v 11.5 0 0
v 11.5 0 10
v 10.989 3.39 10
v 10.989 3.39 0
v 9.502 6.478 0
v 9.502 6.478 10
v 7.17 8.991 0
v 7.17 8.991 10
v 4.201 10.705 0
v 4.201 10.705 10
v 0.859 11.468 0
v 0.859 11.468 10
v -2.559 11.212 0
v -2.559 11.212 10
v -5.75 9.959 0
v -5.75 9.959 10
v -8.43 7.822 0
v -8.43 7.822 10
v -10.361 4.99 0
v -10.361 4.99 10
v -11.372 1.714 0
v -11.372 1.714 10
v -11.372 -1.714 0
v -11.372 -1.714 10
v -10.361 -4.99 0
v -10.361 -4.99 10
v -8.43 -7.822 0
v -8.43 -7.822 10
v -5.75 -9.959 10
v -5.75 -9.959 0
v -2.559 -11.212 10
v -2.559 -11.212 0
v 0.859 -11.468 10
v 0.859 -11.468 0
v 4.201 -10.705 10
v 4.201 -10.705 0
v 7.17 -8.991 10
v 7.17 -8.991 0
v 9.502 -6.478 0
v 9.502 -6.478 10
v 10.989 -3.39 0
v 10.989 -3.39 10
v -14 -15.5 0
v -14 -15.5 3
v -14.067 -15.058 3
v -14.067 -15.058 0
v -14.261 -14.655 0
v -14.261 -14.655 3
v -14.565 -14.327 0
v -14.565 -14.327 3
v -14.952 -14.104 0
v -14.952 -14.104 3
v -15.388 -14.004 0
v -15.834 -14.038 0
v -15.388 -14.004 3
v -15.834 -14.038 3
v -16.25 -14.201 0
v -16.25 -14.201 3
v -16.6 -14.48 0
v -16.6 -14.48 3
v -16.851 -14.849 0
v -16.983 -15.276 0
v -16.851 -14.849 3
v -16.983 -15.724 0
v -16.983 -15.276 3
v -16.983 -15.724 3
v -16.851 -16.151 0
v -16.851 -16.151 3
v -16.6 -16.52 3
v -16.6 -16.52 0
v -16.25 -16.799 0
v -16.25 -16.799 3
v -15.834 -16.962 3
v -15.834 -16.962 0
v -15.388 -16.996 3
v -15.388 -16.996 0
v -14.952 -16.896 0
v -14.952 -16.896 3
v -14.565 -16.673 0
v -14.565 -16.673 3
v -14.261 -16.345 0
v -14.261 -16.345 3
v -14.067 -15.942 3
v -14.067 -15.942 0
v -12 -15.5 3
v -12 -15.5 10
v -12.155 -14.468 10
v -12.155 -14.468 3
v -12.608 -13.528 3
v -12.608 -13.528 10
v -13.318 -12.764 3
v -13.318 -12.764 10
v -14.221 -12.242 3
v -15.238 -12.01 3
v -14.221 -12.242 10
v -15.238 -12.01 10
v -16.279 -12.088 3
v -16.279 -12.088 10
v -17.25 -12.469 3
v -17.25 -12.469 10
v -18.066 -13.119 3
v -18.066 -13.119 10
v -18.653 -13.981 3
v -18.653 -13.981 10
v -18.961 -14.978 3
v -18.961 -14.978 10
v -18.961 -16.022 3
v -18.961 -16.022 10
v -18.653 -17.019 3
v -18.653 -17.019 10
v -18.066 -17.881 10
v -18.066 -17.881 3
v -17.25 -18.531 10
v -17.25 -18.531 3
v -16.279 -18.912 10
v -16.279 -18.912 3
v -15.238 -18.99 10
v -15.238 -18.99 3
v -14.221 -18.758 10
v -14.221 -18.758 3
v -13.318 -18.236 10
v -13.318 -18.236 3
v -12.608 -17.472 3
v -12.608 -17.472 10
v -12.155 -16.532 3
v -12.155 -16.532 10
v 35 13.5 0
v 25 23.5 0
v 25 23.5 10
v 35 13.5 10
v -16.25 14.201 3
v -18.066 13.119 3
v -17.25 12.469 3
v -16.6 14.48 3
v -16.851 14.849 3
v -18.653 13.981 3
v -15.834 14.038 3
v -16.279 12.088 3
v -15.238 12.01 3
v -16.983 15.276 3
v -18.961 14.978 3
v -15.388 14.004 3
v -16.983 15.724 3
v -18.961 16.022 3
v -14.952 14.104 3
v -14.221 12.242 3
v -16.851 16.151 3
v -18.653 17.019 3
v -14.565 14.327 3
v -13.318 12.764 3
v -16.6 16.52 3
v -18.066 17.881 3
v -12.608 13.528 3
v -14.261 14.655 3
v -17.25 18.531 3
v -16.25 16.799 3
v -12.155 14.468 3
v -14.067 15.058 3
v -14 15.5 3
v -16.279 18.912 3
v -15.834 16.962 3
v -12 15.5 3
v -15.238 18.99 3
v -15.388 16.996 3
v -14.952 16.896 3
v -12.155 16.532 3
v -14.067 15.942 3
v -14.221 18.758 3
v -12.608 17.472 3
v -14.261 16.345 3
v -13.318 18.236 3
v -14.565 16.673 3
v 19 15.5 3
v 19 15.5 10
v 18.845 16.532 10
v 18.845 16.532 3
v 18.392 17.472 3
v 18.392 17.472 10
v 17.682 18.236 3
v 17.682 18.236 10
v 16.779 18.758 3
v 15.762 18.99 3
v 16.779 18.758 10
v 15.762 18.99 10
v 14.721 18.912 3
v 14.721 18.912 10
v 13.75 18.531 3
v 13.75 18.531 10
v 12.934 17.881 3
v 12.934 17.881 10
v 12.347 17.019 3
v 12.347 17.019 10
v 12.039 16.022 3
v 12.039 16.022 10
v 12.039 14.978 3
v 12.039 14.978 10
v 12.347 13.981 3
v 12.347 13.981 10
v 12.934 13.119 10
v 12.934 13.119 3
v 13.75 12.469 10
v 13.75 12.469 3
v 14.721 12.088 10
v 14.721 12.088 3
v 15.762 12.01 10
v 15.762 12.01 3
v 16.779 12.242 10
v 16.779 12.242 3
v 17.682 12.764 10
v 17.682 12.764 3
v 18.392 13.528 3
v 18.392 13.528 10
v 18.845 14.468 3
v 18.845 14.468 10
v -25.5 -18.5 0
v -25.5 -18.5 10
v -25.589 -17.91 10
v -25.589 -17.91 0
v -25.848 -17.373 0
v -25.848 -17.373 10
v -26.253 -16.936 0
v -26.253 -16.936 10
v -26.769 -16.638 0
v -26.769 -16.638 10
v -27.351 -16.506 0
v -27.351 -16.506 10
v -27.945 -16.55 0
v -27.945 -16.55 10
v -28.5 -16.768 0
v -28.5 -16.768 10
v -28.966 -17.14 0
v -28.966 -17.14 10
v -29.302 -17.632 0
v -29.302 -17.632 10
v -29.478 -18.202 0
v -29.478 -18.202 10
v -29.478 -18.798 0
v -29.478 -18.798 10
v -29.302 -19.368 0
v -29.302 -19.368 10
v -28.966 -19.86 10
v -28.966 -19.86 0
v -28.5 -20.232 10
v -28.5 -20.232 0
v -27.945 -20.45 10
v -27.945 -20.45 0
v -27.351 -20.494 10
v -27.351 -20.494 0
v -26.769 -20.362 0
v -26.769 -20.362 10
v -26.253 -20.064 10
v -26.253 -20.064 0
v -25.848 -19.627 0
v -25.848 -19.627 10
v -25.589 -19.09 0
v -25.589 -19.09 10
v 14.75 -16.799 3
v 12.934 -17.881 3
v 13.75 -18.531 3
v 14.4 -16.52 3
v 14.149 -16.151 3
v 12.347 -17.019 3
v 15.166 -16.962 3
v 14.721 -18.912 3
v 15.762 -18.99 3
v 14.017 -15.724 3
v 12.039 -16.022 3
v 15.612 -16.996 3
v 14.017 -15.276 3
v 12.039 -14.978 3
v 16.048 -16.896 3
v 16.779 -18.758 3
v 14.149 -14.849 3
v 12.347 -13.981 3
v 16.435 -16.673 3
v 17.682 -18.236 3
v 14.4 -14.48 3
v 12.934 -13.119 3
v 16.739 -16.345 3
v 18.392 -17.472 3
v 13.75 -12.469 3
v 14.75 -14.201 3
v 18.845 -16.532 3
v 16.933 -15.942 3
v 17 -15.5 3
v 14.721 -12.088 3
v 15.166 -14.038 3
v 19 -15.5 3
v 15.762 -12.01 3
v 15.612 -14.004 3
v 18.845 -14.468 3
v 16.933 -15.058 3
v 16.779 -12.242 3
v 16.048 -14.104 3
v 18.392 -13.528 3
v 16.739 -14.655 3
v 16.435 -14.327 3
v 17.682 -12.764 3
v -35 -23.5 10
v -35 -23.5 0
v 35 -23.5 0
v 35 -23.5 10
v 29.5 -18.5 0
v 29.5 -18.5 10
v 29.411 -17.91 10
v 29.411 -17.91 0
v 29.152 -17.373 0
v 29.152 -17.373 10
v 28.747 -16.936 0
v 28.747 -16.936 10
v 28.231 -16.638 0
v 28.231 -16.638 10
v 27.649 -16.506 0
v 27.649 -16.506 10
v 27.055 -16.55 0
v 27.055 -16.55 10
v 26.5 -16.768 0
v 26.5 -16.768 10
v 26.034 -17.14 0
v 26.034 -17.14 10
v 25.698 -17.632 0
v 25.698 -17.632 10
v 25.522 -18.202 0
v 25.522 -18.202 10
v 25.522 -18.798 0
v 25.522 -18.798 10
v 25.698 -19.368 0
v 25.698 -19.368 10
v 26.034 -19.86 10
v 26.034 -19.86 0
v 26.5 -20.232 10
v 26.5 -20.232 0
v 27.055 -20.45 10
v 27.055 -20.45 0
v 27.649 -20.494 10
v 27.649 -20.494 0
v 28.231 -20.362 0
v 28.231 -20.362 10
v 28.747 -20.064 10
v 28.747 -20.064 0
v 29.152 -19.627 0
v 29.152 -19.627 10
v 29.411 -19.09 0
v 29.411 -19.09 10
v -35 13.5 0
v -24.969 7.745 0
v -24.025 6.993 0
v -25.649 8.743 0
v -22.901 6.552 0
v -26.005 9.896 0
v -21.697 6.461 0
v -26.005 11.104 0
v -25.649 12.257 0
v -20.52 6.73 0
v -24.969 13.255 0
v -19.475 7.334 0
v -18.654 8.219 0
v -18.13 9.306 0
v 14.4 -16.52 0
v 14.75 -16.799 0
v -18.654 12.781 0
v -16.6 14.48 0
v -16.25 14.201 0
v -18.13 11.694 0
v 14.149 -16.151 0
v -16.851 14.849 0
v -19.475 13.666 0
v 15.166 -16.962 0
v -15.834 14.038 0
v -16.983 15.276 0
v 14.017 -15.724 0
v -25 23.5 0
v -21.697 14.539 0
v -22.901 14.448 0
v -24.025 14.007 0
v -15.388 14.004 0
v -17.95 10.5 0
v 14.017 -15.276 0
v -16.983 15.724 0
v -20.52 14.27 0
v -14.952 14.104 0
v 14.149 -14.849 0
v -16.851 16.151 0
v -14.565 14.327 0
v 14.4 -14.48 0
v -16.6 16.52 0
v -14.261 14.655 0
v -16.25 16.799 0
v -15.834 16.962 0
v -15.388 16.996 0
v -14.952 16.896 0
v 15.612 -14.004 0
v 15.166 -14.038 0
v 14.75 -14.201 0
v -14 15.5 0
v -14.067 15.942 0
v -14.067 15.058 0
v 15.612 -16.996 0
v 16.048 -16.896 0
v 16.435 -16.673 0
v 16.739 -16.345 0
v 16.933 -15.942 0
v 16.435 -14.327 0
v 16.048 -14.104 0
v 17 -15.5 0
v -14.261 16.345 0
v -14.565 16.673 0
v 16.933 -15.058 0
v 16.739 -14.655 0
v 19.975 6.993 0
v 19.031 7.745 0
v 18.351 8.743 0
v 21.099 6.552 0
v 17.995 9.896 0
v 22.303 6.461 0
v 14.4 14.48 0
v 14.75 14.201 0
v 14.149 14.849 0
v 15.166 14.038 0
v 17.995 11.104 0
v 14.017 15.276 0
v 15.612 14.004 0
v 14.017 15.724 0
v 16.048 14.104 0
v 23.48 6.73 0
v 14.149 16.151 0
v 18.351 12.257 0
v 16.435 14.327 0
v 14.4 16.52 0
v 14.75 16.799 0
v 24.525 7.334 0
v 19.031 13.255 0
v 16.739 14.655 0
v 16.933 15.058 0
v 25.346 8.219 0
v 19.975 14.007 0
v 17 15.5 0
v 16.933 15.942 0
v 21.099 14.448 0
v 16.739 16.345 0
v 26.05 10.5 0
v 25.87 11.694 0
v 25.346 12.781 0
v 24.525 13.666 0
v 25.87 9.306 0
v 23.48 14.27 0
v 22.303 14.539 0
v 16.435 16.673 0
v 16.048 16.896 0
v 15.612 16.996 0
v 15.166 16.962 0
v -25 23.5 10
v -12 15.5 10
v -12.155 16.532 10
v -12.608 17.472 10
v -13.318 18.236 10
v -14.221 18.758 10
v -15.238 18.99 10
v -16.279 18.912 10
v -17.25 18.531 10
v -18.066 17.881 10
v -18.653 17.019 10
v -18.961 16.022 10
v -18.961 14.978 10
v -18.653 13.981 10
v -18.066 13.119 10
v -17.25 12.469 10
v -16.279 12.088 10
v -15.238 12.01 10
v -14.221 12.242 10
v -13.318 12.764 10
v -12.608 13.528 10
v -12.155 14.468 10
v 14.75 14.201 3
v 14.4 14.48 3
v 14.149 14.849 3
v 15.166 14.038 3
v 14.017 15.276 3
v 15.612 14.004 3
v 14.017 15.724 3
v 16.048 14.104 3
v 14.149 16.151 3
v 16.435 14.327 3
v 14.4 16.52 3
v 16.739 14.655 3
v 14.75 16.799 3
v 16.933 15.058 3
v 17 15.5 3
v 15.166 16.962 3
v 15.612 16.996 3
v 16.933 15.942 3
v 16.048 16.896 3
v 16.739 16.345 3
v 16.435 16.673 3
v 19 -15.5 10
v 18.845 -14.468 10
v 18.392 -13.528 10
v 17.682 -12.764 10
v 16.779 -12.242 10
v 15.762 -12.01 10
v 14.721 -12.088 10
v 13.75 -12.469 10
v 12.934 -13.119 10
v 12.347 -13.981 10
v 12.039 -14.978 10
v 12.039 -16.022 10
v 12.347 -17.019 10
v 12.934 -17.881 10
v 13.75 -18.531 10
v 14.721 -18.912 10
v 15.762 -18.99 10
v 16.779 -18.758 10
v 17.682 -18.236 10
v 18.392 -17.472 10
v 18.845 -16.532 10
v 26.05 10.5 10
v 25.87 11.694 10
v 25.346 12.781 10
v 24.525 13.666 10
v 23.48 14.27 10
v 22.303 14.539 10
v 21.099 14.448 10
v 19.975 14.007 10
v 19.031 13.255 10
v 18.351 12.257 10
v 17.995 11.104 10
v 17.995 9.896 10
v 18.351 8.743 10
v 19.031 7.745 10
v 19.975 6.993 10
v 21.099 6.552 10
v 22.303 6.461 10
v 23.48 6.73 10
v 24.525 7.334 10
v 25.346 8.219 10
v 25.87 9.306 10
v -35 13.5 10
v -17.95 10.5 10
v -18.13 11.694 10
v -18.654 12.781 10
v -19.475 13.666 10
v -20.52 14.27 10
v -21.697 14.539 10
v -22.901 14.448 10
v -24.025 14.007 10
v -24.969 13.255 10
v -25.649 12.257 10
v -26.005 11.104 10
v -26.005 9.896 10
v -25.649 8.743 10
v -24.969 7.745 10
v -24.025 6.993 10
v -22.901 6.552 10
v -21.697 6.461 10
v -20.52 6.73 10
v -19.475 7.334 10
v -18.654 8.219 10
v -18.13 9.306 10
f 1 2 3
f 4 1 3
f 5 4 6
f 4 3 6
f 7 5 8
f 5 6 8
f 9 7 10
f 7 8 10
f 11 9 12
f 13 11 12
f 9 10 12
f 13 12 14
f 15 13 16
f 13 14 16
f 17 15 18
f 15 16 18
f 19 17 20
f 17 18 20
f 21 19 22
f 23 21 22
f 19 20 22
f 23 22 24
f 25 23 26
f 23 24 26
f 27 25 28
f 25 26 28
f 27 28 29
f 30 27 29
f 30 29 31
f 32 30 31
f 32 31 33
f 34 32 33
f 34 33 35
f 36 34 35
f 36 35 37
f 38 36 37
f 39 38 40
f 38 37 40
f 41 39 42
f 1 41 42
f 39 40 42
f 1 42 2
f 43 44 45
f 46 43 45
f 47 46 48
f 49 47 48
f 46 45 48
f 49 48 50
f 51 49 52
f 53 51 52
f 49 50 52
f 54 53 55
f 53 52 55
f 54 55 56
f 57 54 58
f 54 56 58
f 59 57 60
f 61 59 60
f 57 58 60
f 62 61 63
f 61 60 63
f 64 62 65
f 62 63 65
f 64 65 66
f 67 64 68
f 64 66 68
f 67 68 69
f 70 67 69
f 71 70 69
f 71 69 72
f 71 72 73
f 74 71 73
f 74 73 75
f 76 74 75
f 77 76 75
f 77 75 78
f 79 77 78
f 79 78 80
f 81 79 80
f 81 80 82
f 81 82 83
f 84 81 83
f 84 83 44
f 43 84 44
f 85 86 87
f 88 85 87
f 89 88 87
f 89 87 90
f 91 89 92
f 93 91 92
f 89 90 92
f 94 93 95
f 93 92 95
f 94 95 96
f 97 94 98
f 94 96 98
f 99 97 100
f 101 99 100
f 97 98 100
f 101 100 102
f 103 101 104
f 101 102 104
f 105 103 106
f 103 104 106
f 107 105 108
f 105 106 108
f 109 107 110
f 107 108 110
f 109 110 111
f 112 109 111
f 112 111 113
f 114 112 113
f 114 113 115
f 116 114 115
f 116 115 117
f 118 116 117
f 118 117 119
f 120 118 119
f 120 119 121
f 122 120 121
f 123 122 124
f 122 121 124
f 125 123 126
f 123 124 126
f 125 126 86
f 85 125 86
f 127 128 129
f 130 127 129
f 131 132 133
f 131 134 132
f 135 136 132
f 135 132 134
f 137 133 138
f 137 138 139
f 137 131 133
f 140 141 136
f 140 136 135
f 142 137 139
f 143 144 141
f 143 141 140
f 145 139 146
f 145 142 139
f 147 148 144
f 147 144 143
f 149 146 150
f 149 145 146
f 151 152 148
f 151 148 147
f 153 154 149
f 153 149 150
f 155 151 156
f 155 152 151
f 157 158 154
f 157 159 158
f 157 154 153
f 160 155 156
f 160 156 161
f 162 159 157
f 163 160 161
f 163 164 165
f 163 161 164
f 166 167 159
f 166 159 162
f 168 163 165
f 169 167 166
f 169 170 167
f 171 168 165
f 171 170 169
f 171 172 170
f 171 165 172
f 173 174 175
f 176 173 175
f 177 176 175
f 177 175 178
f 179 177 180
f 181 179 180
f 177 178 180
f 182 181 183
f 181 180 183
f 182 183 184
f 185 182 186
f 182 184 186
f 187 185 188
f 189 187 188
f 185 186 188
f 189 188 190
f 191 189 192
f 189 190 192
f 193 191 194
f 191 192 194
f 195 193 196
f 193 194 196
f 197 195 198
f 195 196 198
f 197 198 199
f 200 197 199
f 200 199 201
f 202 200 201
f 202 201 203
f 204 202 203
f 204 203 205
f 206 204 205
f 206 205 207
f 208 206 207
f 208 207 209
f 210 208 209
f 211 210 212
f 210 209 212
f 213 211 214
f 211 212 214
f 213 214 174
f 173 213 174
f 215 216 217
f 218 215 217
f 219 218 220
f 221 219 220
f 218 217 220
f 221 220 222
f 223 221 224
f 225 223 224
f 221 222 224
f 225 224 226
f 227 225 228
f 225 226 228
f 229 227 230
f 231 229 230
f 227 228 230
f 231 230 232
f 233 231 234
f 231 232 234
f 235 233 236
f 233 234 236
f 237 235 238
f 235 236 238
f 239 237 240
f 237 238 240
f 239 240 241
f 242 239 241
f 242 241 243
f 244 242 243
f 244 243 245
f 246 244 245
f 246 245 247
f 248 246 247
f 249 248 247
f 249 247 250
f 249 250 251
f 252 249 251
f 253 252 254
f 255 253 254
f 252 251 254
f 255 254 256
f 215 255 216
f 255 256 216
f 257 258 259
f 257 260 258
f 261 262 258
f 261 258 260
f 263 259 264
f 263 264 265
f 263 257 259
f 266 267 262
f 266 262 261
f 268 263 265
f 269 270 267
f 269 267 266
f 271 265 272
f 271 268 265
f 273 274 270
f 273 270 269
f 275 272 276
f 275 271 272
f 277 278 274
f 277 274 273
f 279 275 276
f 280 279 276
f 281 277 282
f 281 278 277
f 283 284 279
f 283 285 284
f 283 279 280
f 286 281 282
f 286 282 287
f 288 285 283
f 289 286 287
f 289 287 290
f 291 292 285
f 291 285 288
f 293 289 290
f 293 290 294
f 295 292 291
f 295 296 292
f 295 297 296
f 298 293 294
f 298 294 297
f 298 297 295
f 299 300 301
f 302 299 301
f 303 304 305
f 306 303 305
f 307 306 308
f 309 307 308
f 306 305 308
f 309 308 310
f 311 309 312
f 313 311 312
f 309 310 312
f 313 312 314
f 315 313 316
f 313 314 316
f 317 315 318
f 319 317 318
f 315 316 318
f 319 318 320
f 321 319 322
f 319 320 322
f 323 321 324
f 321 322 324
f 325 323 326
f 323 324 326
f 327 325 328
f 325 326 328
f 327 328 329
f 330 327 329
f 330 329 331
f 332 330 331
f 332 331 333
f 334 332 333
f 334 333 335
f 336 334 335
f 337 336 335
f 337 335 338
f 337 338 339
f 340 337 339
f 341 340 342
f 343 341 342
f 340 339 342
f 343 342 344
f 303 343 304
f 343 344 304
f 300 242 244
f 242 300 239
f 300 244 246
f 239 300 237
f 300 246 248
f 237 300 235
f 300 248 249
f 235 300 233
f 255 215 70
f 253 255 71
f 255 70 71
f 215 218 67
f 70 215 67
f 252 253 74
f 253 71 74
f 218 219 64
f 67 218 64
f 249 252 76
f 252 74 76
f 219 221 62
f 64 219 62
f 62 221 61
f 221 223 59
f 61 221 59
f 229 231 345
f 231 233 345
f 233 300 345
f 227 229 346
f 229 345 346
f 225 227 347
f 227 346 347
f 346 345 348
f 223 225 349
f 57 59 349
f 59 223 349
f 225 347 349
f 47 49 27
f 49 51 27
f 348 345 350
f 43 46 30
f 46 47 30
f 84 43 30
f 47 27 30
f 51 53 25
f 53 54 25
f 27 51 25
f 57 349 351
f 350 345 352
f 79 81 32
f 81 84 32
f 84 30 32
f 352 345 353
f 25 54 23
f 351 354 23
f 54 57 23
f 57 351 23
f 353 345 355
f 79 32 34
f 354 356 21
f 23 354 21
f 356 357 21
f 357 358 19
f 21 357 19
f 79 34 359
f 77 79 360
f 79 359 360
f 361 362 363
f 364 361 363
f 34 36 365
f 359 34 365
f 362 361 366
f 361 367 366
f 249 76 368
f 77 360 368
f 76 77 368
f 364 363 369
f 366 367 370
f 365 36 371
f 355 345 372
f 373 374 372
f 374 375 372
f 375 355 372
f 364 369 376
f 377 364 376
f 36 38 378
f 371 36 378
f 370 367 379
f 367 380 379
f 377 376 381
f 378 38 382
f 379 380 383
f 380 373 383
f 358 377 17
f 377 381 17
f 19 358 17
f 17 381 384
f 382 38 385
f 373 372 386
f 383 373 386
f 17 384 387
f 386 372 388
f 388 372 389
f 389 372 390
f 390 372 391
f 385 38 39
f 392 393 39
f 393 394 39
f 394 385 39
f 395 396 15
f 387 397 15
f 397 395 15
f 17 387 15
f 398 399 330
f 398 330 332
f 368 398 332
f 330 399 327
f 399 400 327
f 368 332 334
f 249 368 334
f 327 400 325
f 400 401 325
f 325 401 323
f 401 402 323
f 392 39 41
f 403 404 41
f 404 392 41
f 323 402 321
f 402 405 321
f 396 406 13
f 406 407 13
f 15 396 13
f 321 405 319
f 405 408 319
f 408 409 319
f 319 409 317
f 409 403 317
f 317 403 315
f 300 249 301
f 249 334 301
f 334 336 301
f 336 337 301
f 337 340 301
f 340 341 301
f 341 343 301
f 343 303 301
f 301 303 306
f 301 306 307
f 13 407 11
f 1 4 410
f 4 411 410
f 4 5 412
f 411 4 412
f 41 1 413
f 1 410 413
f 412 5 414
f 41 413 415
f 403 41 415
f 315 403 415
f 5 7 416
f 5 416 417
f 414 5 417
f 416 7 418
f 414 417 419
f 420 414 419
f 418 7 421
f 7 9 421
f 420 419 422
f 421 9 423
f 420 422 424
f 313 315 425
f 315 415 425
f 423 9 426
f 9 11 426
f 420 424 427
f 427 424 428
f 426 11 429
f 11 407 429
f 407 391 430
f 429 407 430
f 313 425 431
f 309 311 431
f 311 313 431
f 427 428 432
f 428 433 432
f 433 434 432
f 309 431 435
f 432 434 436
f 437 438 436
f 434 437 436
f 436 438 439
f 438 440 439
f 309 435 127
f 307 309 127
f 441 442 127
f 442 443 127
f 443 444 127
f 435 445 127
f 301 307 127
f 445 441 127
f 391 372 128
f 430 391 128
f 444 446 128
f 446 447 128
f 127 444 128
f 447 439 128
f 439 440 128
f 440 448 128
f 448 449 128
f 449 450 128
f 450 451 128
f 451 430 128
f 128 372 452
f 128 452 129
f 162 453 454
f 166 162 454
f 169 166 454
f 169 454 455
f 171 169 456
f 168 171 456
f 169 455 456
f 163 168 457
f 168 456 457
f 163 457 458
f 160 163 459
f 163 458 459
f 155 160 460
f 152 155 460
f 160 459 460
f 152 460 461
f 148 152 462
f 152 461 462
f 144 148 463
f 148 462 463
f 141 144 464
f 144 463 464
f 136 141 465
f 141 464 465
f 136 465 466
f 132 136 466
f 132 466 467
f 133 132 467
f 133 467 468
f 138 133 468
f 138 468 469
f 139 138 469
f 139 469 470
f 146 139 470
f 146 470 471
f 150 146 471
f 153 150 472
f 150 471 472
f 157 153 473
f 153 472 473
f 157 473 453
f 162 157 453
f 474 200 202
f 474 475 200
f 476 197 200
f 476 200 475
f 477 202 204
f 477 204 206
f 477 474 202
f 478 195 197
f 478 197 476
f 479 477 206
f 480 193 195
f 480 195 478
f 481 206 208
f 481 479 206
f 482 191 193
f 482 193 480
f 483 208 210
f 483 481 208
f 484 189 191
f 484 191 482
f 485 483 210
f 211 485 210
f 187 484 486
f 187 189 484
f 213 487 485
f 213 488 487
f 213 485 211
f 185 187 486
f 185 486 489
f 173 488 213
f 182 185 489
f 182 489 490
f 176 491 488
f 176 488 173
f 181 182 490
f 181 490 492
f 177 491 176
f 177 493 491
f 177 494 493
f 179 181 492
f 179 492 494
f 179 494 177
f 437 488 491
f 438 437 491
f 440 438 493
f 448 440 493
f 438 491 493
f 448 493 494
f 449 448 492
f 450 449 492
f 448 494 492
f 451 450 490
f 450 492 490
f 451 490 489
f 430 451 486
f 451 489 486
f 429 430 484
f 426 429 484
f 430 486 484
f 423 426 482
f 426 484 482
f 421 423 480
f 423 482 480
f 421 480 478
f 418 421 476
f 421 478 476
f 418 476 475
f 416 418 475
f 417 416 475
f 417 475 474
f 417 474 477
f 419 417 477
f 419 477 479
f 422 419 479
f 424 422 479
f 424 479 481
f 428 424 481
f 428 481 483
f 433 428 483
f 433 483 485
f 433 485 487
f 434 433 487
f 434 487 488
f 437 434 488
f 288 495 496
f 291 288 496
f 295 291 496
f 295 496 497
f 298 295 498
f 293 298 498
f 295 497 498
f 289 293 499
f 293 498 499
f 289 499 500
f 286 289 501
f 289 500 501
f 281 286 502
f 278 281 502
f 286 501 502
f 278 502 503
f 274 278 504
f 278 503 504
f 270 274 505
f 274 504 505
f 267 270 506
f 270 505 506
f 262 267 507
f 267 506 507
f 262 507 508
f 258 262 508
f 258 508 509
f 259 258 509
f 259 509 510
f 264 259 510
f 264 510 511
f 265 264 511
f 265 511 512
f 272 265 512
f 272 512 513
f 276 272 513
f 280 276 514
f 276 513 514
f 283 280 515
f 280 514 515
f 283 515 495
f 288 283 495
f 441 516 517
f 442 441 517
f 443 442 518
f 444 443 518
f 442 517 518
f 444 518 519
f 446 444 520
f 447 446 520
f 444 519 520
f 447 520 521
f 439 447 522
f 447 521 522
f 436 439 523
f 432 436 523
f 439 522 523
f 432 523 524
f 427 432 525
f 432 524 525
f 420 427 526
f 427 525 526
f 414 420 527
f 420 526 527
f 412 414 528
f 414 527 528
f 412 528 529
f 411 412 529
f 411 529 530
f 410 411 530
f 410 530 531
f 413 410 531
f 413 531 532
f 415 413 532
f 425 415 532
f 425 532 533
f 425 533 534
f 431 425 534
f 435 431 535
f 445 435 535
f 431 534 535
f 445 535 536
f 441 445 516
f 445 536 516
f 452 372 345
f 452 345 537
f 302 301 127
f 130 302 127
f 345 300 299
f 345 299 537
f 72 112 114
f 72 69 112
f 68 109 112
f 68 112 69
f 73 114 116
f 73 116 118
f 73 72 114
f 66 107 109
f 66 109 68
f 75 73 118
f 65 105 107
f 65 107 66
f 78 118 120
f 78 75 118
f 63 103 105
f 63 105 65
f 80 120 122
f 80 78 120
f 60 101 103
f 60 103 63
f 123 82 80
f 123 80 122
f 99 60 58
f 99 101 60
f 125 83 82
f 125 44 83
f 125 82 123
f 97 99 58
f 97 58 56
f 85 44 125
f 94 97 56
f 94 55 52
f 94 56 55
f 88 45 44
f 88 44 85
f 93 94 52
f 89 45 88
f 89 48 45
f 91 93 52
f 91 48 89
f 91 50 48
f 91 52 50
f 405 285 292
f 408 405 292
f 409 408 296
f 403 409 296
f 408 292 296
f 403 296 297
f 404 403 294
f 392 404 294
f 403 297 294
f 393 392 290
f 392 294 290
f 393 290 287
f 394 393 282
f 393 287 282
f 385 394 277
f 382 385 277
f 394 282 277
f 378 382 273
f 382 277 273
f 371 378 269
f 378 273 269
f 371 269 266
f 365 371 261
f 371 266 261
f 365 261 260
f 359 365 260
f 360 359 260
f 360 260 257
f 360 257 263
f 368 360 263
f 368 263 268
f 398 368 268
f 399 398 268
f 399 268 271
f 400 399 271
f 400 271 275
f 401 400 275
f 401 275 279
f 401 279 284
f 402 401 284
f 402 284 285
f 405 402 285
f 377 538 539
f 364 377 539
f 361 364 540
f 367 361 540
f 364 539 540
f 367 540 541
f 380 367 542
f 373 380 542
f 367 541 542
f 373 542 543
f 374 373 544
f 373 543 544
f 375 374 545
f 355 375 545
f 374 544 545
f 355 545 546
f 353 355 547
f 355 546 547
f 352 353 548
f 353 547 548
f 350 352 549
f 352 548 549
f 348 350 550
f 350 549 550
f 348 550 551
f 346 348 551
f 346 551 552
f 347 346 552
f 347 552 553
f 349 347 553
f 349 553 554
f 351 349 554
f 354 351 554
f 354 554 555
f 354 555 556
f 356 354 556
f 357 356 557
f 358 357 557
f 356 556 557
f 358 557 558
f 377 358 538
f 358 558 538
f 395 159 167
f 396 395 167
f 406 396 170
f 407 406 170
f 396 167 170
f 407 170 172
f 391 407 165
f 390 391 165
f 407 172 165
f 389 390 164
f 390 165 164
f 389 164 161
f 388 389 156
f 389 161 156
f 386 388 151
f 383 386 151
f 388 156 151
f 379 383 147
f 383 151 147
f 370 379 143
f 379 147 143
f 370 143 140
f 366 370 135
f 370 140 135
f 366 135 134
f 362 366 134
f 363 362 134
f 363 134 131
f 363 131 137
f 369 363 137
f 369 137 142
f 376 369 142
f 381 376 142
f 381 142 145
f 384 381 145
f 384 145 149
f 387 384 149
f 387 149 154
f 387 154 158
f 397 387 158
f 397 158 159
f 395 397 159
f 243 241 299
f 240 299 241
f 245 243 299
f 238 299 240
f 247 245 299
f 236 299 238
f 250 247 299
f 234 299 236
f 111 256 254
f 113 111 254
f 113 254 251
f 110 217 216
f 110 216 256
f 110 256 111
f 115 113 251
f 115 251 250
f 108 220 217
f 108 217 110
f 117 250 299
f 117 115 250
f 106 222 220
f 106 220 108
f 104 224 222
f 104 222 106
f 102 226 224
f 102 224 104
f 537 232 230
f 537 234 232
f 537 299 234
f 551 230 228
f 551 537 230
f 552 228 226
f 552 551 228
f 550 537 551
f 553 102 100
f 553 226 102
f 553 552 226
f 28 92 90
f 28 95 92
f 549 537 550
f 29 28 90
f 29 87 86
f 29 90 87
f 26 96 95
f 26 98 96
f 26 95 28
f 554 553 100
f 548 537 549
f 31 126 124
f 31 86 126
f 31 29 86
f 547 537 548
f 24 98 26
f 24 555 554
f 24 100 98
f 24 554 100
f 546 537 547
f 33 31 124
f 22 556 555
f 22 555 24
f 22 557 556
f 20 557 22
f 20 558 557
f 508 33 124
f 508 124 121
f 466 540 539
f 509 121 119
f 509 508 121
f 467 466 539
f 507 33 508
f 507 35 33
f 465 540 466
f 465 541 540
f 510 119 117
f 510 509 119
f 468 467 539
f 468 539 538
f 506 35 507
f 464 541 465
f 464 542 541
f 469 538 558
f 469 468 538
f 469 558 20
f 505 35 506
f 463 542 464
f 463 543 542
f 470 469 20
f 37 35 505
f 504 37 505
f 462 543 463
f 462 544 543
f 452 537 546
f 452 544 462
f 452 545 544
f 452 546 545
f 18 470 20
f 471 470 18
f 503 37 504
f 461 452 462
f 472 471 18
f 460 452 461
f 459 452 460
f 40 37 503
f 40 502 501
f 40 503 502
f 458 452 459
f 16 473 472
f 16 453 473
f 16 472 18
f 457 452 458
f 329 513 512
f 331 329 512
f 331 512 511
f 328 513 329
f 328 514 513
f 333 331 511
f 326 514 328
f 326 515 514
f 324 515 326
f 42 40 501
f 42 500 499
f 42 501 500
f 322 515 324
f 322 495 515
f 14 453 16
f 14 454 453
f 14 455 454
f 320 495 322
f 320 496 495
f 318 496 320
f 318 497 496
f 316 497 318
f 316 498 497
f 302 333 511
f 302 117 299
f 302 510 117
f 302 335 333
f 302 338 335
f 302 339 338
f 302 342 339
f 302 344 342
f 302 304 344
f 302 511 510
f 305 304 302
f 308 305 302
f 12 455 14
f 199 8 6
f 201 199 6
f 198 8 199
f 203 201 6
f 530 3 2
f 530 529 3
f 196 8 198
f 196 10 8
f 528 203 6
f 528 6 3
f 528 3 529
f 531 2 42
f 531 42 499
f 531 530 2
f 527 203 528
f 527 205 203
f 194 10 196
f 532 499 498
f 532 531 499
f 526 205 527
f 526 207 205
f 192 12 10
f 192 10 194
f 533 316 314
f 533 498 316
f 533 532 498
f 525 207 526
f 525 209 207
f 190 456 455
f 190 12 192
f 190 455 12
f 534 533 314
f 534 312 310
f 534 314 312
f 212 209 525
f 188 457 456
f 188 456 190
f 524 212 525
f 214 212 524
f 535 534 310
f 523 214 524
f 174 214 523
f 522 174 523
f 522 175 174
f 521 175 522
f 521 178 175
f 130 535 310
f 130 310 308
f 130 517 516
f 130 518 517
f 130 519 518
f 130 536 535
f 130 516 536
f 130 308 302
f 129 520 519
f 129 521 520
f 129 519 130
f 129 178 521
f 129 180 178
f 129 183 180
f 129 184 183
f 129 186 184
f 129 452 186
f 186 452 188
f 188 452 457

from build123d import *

# Parameters (mm, degrees)
SKETCH1_W           = 70
SKETCH1_H           = 47
BOSS_EXTRUDE1_DEPTH = 10
SKETCH2_R           = 11.5
CUT_EXTRUDE1_DEPTH  = 10
SKETCH3_R           = 1.5
CUT_EXTRUDE2_DEPTH  = 10
SKETCH4_R           = 4.05
CUT_EXTRUDE3_DEPTH  = 10
SKETCH6_R           = 2
CUT_EXTRUDE5_DEPTH  = 10
SKETCH7_R           = 3.5
CUT_EXTRUDE6_DEPTH  = 7
CHAMFER1_SIZE       = 10


with BuildPart() as part:
    # Sketch1 → Boss-Extrude1 (new body)
    with BuildSketch(Plane.XY):
        Rectangle(SKETCH1_W, SKETCH1_H)
    extrude(amount=BOSS_EXTRUDE1_DEPTH)

    # Sketch2 → Cut-Extrude1 (cut)
    with BuildSketch(Plane.XY.offset(10)):
        Circle(SKETCH2_R)
    extrude(amount=-CUT_EXTRUDE1_DEPTH, mode=Mode.SUBTRACT)

    # Sketch3 → Cut-Extrude2 (cut)
    with BuildSketch(Plane.XY.offset(10)):
        with Locations((-15.5, 15.5)):
            Circle(SKETCH3_R)
        with Locations((15.5, 15.5)):
            Circle(SKETCH3_R)
        with Locations((15.5, -15.5)):
            Circle(SKETCH3_R)
        with Locations((-15.5, -15.5)):
            Circle(SKETCH3_R)
    extrude(amount=-CUT_EXTRUDE2_DEPTH, mode=Mode.SUBTRACT)

    # Sketch4 → Cut-Extrude3 (cut)
    with BuildSketch(Plane.XY.offset(10)):
        with Locations((-22, 10.5)):
            Circle(SKETCH4_R)
        with Locations((22, 10.5)):
            Circle(SKETCH4_R)
    extrude(amount=-CUT_EXTRUDE3_DEPTH, mode=Mode.SUBTRACT)

    # Sketch6 → Cut-Extrude5 (cut)
    with BuildSketch(Plane.XY.offset(10)):
        with Locations((-27.5, -18.5)):
            Circle(SKETCH6_R)
        with Locations((27.5, -18.5)):
            Circle(SKETCH6_R)
    extrude(amount=-CUT_EXTRUDE5_DEPTH, mode=Mode.SUBTRACT)

    # Sketch7 → Cut-Extrude6 (cut)
    with BuildSketch(Plane.XY.offset(10)):
        with Locations((-15.5, -15.5)):
            Circle(SKETCH7_R)
        with Locations((-15.5, 15.5)):
            Circle(SKETCH7_R)
        with Locations((15.5, 15.5)):
            Circle(SKETCH7_R)
        with Locations((15.5, -15.5)):
            Circle(SKETCH7_R)
    extrude(amount=-CUT_EXTRUDE6_DEPTH, mode=Mode.SUBTRACT)

    # Chamfer1
    chamfer1_edges = [part.edges().sort_by_distance(p)[0] for p in [
        (-35, 23.5, 5),
        (35, 23.5, 5),
    ]]
    chamfer(chamfer1_edges, length=CHAMFER1_SIZE)


solid = part.part
